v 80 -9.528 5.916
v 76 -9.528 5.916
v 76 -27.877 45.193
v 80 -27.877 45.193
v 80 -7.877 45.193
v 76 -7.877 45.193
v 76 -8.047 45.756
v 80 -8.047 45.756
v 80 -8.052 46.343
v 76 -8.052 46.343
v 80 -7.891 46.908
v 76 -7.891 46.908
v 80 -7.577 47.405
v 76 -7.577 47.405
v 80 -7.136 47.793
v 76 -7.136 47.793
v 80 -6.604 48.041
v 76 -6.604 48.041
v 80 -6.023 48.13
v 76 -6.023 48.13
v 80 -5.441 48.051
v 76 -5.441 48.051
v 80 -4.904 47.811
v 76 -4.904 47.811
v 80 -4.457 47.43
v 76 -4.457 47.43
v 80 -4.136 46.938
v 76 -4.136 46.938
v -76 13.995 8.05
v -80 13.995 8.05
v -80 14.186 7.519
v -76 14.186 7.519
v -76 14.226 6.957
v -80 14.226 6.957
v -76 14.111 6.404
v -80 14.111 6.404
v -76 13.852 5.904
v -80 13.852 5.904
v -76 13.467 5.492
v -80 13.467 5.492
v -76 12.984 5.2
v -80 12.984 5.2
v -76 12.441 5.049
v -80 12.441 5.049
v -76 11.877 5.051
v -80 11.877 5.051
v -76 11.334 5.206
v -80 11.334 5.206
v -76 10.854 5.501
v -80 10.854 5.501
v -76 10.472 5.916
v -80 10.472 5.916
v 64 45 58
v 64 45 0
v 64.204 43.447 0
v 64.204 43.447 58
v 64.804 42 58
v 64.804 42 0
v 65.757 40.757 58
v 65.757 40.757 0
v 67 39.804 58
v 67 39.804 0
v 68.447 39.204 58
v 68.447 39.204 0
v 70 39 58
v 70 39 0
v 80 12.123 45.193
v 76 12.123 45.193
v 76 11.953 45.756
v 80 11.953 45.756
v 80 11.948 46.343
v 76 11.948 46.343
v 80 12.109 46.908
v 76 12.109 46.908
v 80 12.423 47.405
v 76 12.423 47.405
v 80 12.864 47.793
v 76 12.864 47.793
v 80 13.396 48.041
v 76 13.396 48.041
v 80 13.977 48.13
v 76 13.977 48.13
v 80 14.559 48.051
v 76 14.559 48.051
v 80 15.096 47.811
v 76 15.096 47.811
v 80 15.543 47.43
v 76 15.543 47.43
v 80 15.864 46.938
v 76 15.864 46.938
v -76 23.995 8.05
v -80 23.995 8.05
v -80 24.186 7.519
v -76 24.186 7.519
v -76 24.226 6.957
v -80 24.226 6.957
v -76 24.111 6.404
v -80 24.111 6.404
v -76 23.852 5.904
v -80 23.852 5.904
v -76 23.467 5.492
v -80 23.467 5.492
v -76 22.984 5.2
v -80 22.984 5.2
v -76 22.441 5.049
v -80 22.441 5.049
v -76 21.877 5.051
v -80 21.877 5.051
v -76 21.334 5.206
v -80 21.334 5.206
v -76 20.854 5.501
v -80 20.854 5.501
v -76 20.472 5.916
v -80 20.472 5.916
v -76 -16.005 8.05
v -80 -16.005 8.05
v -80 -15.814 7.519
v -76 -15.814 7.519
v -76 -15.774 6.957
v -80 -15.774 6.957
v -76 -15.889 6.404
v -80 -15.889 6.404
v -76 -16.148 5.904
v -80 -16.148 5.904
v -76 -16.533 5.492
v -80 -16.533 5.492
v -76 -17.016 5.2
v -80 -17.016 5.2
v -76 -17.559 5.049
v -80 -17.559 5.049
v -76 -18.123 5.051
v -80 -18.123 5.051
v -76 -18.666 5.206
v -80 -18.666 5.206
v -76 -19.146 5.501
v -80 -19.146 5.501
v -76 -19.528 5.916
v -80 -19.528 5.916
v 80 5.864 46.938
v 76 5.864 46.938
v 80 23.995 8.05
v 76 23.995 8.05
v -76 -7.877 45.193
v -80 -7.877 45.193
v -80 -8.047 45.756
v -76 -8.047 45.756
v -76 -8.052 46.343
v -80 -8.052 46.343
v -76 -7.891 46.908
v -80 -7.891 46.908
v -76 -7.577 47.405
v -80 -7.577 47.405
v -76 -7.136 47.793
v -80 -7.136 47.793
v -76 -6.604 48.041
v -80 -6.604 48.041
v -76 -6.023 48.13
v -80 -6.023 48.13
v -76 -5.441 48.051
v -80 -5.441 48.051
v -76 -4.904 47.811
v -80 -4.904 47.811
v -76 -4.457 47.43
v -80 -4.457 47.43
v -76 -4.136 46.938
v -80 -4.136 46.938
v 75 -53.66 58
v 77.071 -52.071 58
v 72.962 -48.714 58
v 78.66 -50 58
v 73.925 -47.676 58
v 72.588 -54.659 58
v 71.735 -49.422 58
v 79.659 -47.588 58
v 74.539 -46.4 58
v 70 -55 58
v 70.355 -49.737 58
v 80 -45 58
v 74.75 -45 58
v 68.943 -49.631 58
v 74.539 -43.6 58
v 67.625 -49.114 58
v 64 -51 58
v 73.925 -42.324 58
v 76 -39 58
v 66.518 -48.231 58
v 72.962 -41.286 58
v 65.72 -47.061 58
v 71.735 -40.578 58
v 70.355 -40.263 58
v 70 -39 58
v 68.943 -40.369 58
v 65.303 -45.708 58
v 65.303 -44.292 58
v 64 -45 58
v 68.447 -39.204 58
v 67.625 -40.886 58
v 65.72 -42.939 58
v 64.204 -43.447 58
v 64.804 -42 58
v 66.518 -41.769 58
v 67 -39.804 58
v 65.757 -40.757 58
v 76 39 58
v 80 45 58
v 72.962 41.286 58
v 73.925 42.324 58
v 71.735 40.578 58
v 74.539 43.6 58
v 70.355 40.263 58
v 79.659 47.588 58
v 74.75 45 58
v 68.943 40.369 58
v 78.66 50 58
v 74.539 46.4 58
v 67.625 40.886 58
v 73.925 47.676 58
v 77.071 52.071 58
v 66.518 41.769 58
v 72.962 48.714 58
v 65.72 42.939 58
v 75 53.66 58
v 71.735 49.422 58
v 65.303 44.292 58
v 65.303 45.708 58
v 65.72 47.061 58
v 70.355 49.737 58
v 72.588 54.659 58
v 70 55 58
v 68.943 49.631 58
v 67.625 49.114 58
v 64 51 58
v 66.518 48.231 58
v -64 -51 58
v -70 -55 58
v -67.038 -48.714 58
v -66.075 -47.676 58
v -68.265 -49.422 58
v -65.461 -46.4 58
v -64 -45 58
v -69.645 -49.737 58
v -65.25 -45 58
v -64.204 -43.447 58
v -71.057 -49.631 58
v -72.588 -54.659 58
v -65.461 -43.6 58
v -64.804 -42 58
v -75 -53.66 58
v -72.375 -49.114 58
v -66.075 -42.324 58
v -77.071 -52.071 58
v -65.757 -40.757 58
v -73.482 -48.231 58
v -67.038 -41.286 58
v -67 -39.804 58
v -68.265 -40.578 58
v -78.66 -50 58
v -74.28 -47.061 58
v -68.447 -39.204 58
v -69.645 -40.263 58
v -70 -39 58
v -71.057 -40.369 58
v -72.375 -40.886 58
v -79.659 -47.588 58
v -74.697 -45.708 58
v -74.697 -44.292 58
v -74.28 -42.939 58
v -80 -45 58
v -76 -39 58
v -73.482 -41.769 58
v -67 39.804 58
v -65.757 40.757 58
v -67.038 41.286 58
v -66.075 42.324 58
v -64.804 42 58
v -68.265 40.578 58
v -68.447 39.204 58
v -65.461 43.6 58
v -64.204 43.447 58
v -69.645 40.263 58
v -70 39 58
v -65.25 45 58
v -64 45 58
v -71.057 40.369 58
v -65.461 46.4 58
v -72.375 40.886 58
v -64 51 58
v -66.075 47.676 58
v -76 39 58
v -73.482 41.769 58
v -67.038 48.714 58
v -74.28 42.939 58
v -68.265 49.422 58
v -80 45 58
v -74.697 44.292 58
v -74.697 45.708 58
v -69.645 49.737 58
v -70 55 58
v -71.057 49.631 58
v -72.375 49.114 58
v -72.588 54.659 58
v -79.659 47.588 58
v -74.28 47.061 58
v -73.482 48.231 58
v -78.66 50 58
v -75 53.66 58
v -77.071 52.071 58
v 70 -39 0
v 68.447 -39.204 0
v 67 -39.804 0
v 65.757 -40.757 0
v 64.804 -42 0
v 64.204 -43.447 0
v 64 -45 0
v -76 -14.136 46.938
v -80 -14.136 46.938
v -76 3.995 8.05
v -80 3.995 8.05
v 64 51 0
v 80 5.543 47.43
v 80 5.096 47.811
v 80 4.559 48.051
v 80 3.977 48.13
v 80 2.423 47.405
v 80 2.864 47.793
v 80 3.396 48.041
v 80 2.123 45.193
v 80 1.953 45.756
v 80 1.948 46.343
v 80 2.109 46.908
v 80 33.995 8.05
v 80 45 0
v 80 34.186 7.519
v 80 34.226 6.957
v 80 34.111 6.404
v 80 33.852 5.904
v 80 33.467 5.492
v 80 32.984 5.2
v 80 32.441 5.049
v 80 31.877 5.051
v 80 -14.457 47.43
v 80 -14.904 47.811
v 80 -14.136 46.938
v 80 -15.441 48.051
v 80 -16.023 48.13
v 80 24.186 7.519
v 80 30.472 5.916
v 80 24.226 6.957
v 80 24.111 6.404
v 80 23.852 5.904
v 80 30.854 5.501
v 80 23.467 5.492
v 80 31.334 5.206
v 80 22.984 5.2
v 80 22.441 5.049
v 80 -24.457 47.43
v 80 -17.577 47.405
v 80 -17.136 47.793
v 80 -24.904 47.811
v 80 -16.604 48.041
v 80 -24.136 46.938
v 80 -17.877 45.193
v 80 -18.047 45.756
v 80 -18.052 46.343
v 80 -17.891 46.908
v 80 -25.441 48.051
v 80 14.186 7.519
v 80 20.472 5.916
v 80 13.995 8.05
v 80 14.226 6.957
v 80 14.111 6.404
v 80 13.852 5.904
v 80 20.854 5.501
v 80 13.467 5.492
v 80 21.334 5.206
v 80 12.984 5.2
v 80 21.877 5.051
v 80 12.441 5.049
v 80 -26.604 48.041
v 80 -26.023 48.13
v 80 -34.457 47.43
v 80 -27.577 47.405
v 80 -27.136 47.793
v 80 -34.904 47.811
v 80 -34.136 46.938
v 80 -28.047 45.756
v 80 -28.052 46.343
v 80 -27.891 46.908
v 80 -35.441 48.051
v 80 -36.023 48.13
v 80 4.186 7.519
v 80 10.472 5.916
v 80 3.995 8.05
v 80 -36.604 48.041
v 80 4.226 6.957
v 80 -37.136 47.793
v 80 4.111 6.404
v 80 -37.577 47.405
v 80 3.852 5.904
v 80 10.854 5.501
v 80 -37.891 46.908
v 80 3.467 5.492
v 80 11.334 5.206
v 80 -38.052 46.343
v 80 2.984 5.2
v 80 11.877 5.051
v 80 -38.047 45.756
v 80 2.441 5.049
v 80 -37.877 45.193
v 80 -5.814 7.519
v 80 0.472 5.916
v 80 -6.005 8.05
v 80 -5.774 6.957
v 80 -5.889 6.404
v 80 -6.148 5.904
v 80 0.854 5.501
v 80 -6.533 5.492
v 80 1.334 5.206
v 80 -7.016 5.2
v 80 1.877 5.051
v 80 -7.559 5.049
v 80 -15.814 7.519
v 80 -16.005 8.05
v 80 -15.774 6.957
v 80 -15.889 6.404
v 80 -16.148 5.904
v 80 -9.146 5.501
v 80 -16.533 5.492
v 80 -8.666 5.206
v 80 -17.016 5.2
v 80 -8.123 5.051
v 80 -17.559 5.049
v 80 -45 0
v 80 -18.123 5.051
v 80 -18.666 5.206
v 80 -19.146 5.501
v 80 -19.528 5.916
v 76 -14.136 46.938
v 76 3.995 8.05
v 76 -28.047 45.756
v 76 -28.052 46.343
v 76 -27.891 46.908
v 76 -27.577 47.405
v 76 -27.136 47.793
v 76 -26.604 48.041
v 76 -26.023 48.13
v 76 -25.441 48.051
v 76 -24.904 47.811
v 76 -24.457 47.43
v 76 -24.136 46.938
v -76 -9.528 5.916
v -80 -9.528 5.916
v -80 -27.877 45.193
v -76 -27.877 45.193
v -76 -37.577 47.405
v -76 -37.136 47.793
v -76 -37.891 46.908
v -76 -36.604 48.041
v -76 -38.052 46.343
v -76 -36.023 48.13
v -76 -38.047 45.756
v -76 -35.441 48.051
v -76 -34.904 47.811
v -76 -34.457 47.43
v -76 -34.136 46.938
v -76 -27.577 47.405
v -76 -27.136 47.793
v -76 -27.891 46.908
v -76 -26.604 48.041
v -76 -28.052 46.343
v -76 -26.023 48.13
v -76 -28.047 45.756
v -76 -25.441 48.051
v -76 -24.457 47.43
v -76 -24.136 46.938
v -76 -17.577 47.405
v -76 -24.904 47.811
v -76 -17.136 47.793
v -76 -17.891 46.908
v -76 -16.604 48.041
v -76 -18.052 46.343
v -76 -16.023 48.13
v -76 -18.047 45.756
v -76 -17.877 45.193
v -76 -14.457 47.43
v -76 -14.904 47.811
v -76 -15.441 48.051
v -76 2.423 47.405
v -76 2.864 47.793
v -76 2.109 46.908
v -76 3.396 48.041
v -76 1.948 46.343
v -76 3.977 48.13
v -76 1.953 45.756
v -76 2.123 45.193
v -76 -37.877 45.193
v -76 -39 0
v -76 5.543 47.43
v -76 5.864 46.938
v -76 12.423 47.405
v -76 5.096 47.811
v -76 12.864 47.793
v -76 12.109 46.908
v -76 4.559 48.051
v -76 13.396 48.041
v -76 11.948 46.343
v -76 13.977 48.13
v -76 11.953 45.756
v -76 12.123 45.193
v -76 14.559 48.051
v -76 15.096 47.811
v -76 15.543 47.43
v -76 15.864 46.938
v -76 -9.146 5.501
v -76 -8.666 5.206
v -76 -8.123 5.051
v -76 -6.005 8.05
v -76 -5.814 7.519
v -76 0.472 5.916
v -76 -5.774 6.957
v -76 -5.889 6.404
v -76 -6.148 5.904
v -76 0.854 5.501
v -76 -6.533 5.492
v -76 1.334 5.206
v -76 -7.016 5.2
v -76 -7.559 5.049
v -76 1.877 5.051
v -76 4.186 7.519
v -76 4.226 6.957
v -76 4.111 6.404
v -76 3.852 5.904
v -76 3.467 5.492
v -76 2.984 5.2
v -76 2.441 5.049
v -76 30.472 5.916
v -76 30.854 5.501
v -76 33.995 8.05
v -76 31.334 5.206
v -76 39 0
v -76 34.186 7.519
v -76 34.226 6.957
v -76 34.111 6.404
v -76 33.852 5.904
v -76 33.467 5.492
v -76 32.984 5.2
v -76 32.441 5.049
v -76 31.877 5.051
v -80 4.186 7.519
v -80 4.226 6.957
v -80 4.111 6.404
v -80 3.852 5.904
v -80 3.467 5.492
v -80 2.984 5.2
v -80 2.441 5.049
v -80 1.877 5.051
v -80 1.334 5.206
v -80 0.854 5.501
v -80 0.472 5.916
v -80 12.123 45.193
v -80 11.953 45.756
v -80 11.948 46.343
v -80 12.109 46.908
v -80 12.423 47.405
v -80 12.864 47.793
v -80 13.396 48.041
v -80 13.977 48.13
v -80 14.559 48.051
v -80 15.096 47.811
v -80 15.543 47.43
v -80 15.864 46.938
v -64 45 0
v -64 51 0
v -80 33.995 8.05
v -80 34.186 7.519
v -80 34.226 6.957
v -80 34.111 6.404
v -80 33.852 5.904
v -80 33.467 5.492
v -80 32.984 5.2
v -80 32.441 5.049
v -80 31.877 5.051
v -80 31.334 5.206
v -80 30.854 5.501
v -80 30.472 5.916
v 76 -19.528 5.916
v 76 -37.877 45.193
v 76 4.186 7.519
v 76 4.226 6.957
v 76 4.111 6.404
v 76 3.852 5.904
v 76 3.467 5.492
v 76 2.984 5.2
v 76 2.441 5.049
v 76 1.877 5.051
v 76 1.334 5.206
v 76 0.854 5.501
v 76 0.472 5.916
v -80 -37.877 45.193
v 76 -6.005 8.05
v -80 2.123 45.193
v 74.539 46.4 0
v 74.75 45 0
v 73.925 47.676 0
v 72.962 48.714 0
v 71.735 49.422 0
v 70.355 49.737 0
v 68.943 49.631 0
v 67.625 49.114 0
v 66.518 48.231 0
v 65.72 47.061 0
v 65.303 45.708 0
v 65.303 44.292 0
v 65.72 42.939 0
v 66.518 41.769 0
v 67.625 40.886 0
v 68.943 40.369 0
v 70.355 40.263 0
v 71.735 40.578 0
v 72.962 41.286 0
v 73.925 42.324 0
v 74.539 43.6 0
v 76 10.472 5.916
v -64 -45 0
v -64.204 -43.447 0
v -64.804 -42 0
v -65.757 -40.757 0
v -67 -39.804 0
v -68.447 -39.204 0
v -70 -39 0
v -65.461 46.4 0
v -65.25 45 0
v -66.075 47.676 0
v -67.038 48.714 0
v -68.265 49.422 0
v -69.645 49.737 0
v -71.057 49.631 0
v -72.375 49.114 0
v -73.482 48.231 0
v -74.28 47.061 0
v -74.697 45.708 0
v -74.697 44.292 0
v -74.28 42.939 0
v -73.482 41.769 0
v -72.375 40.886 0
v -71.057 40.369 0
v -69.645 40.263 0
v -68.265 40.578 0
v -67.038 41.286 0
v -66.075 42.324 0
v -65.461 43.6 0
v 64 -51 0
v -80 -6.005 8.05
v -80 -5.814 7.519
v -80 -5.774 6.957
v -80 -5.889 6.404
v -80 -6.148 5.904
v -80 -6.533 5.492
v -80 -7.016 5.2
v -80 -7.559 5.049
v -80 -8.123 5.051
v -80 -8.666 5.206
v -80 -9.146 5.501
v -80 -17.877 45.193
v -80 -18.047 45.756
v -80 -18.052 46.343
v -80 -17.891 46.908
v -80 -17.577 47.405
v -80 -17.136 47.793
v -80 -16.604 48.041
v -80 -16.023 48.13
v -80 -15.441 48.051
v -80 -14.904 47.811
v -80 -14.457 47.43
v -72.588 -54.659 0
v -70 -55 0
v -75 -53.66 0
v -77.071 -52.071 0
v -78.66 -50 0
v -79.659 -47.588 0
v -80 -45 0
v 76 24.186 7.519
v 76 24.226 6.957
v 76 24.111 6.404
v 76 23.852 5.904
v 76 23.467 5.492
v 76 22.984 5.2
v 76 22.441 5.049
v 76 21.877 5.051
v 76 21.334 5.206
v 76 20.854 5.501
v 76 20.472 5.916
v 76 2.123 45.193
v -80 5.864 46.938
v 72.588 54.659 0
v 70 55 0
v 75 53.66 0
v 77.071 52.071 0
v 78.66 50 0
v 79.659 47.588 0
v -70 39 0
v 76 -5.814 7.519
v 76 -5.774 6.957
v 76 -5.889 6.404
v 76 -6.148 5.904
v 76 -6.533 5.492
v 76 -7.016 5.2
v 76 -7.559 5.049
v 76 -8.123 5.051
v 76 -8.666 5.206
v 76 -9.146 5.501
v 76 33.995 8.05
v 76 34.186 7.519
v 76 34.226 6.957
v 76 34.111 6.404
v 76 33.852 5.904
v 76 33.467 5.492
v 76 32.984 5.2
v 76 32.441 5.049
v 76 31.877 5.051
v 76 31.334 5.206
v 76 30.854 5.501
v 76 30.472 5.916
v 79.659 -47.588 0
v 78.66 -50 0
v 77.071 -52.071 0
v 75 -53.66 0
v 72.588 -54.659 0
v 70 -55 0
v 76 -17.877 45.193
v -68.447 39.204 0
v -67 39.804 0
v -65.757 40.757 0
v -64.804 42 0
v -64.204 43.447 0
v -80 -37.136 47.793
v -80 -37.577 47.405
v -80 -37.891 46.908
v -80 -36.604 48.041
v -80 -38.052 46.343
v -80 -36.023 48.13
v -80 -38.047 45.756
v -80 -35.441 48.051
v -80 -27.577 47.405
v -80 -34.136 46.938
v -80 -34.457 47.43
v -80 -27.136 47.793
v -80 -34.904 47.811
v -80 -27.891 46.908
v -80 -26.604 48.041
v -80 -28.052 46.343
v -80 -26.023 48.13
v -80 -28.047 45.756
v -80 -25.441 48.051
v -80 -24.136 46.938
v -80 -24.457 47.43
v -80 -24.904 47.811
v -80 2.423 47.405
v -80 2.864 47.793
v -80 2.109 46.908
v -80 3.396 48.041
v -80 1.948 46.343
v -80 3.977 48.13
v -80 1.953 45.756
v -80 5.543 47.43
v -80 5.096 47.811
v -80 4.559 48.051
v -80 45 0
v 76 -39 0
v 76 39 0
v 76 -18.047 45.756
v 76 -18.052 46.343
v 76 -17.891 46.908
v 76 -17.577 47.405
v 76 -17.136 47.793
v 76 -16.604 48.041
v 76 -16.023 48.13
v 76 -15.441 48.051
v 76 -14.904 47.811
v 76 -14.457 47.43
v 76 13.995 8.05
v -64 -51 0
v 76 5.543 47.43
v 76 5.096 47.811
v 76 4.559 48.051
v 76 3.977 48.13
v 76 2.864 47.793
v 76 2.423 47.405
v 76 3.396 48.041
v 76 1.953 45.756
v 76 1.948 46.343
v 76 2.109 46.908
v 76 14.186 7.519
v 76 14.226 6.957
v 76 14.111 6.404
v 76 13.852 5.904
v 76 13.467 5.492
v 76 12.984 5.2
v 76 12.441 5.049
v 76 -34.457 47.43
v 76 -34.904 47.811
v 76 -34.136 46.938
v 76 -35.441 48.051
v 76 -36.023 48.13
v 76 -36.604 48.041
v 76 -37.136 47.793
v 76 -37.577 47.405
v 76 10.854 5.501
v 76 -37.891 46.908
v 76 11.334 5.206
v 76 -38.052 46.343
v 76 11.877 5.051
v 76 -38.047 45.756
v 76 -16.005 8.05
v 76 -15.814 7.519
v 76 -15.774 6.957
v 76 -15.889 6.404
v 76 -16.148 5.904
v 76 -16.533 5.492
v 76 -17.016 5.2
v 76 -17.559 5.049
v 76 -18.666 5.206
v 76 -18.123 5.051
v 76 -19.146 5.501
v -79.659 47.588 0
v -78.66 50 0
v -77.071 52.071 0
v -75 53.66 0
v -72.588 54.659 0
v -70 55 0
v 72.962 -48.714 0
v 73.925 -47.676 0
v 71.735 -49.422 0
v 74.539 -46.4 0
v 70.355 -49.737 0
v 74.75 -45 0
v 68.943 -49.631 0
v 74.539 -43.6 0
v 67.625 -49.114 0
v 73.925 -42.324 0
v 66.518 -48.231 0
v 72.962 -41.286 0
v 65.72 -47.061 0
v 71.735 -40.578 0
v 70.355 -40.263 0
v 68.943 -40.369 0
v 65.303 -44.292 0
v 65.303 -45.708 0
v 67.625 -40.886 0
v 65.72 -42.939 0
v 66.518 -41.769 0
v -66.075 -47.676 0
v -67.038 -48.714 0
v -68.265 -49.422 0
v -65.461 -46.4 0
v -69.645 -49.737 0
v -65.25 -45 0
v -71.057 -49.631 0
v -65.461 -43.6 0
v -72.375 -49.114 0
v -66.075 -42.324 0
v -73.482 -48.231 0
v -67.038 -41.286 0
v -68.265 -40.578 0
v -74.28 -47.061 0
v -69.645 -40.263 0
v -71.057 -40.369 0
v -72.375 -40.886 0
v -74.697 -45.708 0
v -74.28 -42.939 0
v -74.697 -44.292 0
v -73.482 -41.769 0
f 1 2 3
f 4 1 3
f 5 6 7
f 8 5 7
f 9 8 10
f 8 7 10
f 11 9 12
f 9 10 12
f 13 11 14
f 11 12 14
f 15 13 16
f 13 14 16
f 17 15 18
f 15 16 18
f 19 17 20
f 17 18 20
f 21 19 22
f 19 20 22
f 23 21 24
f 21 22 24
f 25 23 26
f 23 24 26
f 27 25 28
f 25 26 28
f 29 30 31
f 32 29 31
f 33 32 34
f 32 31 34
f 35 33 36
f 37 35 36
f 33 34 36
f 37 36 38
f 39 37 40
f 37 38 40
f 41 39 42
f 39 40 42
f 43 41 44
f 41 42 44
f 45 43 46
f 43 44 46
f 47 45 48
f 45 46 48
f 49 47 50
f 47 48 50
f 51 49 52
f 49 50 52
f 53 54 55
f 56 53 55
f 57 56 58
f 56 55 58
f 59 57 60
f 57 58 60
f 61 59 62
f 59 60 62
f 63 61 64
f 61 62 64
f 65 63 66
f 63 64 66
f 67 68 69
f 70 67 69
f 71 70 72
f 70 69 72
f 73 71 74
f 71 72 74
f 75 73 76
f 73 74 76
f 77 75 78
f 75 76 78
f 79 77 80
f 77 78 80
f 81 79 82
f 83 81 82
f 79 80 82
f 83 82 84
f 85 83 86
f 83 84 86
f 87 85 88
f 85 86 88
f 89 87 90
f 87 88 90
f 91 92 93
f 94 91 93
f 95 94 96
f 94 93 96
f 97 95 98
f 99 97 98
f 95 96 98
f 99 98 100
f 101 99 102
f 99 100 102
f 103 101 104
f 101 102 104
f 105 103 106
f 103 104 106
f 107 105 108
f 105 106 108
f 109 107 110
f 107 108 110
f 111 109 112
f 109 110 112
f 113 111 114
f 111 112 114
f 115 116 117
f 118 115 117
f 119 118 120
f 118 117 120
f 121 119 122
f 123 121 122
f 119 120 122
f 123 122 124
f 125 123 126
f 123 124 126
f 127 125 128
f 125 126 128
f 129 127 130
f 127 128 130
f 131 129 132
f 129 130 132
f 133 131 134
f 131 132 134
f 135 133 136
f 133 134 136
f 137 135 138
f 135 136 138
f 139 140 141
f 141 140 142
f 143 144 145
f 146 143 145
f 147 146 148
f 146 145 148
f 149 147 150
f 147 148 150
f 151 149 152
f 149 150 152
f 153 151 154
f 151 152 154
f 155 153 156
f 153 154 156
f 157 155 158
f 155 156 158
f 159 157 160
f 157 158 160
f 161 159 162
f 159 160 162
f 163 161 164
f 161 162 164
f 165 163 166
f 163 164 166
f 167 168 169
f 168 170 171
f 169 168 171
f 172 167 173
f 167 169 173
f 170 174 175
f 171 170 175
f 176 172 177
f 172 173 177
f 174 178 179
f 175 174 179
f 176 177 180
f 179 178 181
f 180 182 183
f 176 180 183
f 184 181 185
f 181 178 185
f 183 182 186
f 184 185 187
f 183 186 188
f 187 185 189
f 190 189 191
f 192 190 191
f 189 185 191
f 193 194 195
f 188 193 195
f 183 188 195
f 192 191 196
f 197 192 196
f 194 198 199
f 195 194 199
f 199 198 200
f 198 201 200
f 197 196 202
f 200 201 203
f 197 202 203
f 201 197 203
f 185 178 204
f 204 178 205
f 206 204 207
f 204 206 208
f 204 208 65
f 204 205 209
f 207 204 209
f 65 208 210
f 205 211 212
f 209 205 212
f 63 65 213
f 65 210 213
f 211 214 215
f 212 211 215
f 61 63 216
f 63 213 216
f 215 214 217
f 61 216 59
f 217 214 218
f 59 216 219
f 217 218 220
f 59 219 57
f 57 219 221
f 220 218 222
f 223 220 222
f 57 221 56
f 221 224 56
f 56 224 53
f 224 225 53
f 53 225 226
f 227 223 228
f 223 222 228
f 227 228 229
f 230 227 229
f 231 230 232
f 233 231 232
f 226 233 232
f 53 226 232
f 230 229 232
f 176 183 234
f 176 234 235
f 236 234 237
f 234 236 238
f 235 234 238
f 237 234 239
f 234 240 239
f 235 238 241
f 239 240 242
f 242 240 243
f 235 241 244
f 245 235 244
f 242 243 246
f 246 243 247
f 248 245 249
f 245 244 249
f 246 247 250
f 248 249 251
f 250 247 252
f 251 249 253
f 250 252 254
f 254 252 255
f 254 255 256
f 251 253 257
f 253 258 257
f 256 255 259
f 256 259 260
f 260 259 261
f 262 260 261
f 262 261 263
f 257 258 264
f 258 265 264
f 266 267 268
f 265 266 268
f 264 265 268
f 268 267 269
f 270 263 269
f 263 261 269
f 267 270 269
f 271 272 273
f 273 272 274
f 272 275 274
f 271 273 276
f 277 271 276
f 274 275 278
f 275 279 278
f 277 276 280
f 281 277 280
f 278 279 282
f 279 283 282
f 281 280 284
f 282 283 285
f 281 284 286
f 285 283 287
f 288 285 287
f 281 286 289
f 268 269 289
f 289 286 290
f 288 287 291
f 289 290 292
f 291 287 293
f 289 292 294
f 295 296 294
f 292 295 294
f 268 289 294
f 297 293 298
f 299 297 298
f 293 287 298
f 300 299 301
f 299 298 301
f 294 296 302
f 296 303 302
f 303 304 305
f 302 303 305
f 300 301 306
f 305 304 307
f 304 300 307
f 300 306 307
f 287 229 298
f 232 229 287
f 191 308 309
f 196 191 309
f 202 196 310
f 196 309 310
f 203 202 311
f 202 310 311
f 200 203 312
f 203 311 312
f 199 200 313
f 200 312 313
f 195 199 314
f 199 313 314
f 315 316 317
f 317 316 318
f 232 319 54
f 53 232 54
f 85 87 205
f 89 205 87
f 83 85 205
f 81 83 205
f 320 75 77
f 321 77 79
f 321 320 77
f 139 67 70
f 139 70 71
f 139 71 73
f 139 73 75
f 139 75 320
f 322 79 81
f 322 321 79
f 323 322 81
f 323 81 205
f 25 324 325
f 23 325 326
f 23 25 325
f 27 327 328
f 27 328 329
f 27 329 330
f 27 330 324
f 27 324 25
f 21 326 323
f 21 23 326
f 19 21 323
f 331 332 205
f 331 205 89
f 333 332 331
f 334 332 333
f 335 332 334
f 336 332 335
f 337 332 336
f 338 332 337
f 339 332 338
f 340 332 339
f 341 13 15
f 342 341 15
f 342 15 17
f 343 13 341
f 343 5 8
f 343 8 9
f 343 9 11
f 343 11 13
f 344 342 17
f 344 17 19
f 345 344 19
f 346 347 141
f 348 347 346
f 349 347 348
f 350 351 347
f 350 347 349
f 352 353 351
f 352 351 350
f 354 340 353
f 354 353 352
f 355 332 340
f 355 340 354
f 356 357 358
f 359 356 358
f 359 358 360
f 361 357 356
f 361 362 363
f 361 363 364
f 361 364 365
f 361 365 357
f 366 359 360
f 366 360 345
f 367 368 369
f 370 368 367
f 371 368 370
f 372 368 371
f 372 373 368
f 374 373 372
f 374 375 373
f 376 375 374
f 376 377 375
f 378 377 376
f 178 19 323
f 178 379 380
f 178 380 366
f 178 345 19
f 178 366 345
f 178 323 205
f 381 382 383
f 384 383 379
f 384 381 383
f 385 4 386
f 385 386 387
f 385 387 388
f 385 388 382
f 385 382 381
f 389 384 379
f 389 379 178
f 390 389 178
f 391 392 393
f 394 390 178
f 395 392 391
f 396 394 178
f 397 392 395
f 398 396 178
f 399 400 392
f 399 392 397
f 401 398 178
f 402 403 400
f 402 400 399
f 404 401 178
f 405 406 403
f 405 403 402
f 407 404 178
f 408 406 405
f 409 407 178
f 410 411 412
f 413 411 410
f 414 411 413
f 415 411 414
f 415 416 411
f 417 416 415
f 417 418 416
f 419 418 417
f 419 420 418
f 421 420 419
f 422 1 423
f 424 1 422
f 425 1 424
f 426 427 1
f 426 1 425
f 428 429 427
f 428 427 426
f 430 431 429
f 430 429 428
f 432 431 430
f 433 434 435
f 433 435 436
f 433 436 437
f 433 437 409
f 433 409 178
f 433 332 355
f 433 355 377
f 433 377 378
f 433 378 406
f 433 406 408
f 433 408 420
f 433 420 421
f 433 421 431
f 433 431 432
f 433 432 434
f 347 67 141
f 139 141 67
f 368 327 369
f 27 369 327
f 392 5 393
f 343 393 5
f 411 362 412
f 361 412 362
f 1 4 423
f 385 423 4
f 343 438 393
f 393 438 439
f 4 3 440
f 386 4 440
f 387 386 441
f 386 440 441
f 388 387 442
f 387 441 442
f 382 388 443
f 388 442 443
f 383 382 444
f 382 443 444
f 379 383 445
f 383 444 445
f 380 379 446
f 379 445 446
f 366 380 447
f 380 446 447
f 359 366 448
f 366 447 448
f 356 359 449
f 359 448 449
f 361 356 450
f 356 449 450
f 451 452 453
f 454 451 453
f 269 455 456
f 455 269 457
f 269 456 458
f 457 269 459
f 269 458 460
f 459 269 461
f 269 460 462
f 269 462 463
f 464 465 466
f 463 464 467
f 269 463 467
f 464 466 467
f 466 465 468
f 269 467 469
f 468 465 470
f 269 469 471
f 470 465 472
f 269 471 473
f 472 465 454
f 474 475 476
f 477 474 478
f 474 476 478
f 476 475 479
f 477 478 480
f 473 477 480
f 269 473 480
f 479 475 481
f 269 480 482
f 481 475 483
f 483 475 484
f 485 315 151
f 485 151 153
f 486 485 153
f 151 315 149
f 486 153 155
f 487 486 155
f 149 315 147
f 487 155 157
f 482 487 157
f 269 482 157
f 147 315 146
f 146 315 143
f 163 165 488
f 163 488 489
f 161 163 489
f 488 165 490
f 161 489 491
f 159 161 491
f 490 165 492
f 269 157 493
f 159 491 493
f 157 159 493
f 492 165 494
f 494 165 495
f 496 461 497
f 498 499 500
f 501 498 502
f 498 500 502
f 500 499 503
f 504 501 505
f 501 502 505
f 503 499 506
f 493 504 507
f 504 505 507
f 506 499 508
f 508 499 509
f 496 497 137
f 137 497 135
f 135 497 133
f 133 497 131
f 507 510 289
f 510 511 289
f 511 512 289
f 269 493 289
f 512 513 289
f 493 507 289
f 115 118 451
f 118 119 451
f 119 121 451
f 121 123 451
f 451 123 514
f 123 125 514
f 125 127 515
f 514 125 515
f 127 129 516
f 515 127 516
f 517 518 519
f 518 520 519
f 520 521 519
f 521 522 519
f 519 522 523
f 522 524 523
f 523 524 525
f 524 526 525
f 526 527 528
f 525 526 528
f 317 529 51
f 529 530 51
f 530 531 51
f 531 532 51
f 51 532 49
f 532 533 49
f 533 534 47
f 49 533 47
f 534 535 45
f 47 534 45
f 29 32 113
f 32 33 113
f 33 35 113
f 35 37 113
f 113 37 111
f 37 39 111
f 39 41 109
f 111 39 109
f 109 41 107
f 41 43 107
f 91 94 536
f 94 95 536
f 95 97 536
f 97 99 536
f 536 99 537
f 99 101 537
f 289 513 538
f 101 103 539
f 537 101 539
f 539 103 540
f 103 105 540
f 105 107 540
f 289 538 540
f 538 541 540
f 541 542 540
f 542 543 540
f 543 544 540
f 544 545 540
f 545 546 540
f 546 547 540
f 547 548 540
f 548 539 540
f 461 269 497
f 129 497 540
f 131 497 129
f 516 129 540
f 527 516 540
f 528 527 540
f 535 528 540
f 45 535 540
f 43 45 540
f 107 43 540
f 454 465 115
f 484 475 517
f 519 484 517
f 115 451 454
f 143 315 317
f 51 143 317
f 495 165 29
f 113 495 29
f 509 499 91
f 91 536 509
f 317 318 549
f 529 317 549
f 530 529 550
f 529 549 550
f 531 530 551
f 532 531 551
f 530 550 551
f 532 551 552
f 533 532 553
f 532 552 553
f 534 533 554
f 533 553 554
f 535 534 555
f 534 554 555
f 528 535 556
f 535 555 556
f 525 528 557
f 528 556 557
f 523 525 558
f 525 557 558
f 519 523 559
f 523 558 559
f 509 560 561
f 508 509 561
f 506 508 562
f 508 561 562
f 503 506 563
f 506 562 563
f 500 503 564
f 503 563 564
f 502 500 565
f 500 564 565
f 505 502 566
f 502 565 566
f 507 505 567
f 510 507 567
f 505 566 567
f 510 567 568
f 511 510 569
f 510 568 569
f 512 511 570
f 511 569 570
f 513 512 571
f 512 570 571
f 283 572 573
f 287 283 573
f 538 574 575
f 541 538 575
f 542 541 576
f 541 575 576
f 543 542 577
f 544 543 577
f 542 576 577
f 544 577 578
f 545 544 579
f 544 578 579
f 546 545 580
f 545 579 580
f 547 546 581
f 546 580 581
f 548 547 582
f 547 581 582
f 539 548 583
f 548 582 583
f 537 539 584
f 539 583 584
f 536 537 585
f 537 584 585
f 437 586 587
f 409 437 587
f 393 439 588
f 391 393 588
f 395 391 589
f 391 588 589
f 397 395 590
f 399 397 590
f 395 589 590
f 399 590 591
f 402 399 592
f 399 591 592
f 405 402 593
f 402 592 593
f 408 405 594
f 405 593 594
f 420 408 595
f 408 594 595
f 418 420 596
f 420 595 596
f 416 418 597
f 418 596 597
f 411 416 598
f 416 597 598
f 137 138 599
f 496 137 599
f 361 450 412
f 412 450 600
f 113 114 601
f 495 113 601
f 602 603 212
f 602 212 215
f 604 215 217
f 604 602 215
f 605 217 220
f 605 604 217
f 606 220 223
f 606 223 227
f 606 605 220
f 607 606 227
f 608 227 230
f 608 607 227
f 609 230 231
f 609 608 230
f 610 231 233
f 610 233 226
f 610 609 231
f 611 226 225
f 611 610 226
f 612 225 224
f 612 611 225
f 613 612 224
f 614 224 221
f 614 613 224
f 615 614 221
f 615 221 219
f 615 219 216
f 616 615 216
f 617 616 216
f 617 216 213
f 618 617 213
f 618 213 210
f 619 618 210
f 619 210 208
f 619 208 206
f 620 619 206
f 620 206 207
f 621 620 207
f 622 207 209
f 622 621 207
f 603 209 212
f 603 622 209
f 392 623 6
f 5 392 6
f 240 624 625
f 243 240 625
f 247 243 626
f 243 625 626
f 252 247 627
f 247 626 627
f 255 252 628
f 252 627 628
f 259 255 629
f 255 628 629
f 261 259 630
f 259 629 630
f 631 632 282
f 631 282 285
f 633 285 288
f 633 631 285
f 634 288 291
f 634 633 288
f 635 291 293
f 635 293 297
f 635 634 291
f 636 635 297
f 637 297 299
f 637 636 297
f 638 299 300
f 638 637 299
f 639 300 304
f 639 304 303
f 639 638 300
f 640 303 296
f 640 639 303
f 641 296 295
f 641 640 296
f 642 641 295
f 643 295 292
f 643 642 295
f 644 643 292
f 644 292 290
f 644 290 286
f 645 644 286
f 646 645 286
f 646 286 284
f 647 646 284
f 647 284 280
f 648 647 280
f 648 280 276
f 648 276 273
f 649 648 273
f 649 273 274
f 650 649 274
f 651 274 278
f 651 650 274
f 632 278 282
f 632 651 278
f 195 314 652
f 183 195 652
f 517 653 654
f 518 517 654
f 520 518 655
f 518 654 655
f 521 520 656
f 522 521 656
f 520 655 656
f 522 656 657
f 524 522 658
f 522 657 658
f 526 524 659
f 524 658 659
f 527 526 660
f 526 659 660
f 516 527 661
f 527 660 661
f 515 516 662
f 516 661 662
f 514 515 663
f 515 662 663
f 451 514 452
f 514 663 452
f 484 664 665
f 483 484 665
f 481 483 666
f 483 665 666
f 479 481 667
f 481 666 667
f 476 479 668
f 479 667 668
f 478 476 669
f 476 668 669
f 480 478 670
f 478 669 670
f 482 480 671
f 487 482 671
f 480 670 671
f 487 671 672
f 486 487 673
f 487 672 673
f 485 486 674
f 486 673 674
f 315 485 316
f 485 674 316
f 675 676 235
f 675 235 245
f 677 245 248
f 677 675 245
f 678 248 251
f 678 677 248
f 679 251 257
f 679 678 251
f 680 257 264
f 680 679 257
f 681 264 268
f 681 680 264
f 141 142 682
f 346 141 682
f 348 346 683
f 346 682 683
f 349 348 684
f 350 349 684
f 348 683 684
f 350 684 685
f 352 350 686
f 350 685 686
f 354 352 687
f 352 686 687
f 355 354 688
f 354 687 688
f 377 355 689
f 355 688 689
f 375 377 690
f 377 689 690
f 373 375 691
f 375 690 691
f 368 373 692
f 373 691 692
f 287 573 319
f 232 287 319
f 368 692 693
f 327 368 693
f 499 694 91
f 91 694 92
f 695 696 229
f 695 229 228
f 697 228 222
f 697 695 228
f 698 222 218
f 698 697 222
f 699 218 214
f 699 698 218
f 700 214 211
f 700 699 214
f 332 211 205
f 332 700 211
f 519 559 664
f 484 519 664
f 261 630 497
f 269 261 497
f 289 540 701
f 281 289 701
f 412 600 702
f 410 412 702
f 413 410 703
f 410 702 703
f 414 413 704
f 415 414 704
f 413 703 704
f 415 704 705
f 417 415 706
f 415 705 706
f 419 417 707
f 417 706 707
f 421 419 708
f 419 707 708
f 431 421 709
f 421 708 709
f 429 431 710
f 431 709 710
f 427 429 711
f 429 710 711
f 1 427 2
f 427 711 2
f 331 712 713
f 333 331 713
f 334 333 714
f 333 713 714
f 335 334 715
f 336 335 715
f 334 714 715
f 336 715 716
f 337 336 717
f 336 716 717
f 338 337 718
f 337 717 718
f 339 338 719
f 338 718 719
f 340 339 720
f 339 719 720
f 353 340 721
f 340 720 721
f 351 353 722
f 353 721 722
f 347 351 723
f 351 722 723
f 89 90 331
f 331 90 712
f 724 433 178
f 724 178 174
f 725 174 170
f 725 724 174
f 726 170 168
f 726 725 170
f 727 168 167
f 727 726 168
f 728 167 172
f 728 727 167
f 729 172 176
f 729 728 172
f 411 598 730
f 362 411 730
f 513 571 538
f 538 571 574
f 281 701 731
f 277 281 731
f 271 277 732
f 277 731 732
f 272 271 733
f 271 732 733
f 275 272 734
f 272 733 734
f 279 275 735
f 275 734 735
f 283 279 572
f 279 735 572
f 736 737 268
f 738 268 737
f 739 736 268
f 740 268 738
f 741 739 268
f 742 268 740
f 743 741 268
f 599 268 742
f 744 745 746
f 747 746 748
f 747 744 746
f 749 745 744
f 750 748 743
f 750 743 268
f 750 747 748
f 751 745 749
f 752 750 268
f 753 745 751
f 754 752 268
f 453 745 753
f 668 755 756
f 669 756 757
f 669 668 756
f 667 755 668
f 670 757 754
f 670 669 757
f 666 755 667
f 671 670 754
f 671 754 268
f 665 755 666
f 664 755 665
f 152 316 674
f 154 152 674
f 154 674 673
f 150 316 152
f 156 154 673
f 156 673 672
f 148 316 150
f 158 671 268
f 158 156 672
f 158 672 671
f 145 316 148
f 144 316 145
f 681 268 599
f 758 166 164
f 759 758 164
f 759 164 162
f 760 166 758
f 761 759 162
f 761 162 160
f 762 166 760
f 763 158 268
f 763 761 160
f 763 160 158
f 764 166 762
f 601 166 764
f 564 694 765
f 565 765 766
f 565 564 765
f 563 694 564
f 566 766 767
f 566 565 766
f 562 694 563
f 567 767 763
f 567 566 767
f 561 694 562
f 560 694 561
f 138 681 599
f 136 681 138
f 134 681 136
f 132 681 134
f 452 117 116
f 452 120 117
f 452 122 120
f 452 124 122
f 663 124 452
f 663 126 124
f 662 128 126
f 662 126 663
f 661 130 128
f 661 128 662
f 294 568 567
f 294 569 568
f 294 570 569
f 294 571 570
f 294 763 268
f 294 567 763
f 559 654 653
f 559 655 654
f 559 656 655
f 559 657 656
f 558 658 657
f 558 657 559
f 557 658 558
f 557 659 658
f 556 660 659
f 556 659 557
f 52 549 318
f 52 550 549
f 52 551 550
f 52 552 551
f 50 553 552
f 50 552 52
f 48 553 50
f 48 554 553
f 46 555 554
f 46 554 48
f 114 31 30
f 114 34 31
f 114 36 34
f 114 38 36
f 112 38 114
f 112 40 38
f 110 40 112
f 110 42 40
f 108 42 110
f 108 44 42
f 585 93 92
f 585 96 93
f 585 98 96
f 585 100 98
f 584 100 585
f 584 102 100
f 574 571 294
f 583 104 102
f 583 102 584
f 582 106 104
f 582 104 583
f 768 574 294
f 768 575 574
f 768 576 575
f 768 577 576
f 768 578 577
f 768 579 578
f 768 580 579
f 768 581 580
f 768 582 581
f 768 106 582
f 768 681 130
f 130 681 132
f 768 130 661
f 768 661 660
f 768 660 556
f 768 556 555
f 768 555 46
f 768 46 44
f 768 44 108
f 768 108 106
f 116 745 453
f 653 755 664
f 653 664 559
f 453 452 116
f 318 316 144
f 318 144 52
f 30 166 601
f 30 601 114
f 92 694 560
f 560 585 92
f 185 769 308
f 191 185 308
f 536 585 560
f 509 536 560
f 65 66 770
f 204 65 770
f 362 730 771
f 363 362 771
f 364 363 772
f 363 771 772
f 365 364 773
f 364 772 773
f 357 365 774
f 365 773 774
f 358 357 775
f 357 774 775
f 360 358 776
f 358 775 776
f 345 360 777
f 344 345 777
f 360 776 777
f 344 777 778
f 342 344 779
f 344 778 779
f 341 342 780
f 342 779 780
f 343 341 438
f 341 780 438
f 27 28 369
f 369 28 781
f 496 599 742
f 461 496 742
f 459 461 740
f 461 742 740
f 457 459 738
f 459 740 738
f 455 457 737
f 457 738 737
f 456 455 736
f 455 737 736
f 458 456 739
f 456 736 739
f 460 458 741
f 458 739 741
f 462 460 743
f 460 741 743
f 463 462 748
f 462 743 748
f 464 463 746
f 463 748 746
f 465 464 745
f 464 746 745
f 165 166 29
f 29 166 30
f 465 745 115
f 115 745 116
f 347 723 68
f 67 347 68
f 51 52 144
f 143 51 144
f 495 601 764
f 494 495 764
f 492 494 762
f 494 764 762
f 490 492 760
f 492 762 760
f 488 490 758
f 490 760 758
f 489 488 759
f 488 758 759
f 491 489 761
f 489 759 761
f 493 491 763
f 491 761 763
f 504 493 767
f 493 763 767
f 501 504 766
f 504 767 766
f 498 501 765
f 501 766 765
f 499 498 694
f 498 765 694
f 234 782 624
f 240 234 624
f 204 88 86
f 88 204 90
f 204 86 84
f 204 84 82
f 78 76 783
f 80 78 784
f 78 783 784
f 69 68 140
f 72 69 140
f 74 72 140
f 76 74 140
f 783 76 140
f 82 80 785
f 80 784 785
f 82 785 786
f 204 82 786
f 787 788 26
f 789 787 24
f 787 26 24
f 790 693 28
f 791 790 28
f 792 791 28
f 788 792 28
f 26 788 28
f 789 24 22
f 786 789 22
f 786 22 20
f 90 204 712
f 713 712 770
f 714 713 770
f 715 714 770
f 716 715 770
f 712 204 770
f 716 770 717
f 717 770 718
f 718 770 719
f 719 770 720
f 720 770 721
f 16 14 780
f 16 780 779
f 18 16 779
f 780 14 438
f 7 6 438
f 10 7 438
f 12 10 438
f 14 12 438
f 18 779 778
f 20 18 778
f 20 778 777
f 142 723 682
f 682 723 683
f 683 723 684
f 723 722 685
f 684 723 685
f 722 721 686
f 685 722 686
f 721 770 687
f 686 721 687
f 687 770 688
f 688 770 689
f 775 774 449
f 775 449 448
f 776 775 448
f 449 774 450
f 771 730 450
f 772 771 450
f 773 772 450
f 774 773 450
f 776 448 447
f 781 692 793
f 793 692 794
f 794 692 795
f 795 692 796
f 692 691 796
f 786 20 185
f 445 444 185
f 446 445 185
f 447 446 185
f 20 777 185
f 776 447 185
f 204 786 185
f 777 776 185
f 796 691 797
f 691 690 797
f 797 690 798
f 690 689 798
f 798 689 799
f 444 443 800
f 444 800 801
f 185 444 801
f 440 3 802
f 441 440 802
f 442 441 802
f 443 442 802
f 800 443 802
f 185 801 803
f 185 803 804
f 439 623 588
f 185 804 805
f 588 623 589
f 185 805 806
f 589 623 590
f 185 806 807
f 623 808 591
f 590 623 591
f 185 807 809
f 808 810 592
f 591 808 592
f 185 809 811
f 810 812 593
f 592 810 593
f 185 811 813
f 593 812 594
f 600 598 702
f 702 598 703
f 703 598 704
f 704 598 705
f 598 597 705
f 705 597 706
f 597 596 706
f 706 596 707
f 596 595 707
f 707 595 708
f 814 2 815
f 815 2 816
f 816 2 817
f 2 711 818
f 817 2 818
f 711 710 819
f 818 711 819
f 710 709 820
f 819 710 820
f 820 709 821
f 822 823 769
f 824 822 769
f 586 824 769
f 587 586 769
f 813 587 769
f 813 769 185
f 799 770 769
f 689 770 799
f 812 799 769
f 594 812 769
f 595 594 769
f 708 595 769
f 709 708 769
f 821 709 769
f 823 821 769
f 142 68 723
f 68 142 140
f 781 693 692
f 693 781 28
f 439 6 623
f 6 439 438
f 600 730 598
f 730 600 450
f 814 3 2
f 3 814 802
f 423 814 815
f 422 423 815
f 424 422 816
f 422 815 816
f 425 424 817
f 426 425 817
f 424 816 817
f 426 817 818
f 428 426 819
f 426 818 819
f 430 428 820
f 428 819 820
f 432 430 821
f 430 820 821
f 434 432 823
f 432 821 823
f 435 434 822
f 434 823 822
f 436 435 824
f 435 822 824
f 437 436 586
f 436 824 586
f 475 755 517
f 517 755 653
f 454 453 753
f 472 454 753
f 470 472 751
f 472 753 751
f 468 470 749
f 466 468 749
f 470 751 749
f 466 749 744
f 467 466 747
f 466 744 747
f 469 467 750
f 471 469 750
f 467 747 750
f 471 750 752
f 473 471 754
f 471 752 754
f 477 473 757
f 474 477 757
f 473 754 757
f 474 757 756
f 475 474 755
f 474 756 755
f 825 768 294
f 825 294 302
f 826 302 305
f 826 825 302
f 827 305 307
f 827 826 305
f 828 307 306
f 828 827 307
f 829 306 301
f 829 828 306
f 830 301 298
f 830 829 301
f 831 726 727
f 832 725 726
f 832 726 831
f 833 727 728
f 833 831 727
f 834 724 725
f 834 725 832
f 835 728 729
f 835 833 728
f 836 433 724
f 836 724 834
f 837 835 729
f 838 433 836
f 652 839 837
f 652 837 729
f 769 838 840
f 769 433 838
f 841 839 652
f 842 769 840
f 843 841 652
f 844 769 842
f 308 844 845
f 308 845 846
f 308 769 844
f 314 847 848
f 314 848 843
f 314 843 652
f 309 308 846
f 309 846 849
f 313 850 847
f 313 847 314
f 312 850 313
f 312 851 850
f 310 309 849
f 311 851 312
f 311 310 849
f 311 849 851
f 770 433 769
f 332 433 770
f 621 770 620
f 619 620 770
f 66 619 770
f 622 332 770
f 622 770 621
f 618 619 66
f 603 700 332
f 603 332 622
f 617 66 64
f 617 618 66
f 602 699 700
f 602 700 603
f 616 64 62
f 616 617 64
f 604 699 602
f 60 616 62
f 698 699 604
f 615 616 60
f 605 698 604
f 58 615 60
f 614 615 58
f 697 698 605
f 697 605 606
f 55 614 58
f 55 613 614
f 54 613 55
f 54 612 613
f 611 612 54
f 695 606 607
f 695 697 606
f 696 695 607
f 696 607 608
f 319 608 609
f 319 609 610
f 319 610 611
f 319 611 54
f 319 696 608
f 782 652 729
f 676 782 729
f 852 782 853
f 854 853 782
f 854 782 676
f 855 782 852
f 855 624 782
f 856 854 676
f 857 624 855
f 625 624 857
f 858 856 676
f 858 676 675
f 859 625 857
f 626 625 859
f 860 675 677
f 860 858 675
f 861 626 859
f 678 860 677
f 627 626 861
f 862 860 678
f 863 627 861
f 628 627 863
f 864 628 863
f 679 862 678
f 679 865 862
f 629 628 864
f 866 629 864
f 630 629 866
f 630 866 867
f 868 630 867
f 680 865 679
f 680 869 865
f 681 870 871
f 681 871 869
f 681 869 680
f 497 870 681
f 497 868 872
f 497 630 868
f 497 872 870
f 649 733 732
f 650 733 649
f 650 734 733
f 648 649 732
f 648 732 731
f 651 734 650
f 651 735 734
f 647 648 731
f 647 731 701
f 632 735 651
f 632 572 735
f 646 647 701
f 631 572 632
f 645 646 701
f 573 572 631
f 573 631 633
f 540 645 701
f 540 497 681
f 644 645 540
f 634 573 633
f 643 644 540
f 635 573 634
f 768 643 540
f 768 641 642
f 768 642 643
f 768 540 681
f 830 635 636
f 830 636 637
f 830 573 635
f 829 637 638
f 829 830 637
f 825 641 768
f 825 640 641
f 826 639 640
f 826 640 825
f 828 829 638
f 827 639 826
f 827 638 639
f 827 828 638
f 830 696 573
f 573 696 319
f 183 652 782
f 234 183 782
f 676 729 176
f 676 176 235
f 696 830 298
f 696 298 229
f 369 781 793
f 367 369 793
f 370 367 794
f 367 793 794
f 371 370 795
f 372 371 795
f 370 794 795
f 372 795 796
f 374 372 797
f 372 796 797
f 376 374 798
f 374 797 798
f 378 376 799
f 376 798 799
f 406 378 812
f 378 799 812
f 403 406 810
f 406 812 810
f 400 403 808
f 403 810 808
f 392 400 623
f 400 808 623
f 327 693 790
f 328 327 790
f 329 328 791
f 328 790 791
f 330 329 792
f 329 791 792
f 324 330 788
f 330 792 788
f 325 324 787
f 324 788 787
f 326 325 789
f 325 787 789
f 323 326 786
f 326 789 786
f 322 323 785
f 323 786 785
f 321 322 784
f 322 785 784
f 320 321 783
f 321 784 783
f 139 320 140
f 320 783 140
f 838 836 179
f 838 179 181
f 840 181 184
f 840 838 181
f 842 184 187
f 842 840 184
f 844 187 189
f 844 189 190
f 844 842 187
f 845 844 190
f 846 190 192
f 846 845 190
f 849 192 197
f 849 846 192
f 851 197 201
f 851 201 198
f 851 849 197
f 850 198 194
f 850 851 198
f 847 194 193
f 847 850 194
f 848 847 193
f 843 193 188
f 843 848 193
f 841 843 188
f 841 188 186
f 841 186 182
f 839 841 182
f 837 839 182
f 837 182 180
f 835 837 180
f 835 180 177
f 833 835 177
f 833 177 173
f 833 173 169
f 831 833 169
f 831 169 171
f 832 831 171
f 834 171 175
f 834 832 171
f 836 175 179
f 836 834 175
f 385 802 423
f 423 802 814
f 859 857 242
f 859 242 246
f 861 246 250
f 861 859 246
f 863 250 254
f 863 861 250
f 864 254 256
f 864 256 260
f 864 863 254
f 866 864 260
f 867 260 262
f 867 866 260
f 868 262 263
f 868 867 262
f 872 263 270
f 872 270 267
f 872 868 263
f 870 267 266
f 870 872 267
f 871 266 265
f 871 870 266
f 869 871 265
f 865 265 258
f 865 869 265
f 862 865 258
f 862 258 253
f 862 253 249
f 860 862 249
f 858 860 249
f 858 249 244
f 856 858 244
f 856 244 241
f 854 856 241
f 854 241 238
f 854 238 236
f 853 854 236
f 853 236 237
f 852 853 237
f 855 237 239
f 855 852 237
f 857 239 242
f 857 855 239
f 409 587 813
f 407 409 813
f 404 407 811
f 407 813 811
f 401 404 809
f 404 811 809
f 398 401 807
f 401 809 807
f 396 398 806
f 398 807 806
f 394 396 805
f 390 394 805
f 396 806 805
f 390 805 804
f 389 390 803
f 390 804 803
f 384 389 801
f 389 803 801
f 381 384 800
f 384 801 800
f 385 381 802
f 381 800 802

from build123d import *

# Parameters (mm, degrees)
SKETCH_1_R             = 4.75
EXTRUDE_1_DEPTH        = 58
CUT_EXTRUDE_1_DEPTH    = 169
PATTERN_LINEAR_1_COUNT = 6
PATTERN_LINEAR_1_PITCH = 10


with BuildPart() as part:
    # Эскиз1 → Бобышка-Вытянуть1 (new body)
    with BuildSketch(Plane.XY):
        with BuildLine():
            Line((-70, 55), (70, 55))
            ThreePointArc((70, 55), (77.071067812, 52.071067812), (80, 45))
            Line((80, 45), (80, -45))
            ThreePointArc((80, -45), (77.071067812, -52.071067812), (70, -55))
            Line((70, -55), (-70, -55))
            ThreePointArc((-70, -55), (-77.071067812, -52.071067812), (-80, -45))
            Line((-80, -45), (-80, 45))
            ThreePointArc((-80, 45), (-77.071067812, 52.071067812), (-70, 55))
        make_face()
        with Locations((70, 45)):
            Circle(SKETCH_1_R, mode=Mode.SUBTRACT)
        with Locations((70, -45)):
            Circle(SKETCH_1_R, mode=Mode.SUBTRACT)
        with Locations((-70, -45)):
            Circle(SKETCH_1_R, mode=Mode.SUBTRACT)
        with Locations((-70, 45)):
            Circle(SKETCH_1_R, mode=Mode.SUBTRACT)
        with BuildLine():
            Line((-64, 51), (64, 51))
            Line((64, 51), (64, 45))
            ThreePointArc((64, 45), (65.757359313, 40.757359313), (70, 39))
            Line((70, 39), (76, 39))
            Line((76, 39), (76, -39))
            Line((76, -39), (70, -39))
            ThreePointArc((70, -39), (65.757359313, -40.757359313), (64, -45))
            Line((64, -45), (64, -51))
            Line((64, -51), (-64, -51))
            Line((-64, -51), (-64, -45))
            ThreePointArc((-64, -45), (-65.757359313, -40.757359313), (-70, -39))
            Line((-70, -39), (-76, -39))
            Line((-76, -39), (-76, 39))
            Line((-76, 39), (-70, 39))
            ThreePointArc((-70, 39), (-65.757359313, 40.757359313), (-64, 45))
            Line((-64, 45), (-64, 51))
        make_face(mode=Mode.SUBTRACT)
    extrude(amount=EXTRUDE_1_DEPTH)

    # Эскиз2 → Вырез-Вытянуть1 (cut)
    with BuildSketch(Plane.ZY.offset(80)):
        with BuildLine():
            Line((46.937976774, 15.864192118), (8.050346324, 33.995467526))
            ThreePointArc((8.050346324, 33.995467526), (5.329053146, 33.235382363), (5.916242197, 30.471621333))
            Line((5.916242197, 30.471621333), (45.193454902, 12.123052891))
            ThreePointArc((45.193454902, 12.123052891), (47.936328276, 13.121453414), (46.937976774, 15.864192118))
        make_face()
    cut_extrude_1 = extrude(amount=-CUT_EXTRUDE_1_DEPTH, mode=Mode.SUBTRACT)

    # Линейный массив1: Вырез-Вытянуть1 ×6
    with Locations(*[(0, -i * PATTERN_LINEAR_1_PITCH, 0) for i in range(1, PATTERN_LINEAR_1_COUNT)]):
        add(cut_extrude_1, mode=Mode.SUBTRACT)


solid = part.part
